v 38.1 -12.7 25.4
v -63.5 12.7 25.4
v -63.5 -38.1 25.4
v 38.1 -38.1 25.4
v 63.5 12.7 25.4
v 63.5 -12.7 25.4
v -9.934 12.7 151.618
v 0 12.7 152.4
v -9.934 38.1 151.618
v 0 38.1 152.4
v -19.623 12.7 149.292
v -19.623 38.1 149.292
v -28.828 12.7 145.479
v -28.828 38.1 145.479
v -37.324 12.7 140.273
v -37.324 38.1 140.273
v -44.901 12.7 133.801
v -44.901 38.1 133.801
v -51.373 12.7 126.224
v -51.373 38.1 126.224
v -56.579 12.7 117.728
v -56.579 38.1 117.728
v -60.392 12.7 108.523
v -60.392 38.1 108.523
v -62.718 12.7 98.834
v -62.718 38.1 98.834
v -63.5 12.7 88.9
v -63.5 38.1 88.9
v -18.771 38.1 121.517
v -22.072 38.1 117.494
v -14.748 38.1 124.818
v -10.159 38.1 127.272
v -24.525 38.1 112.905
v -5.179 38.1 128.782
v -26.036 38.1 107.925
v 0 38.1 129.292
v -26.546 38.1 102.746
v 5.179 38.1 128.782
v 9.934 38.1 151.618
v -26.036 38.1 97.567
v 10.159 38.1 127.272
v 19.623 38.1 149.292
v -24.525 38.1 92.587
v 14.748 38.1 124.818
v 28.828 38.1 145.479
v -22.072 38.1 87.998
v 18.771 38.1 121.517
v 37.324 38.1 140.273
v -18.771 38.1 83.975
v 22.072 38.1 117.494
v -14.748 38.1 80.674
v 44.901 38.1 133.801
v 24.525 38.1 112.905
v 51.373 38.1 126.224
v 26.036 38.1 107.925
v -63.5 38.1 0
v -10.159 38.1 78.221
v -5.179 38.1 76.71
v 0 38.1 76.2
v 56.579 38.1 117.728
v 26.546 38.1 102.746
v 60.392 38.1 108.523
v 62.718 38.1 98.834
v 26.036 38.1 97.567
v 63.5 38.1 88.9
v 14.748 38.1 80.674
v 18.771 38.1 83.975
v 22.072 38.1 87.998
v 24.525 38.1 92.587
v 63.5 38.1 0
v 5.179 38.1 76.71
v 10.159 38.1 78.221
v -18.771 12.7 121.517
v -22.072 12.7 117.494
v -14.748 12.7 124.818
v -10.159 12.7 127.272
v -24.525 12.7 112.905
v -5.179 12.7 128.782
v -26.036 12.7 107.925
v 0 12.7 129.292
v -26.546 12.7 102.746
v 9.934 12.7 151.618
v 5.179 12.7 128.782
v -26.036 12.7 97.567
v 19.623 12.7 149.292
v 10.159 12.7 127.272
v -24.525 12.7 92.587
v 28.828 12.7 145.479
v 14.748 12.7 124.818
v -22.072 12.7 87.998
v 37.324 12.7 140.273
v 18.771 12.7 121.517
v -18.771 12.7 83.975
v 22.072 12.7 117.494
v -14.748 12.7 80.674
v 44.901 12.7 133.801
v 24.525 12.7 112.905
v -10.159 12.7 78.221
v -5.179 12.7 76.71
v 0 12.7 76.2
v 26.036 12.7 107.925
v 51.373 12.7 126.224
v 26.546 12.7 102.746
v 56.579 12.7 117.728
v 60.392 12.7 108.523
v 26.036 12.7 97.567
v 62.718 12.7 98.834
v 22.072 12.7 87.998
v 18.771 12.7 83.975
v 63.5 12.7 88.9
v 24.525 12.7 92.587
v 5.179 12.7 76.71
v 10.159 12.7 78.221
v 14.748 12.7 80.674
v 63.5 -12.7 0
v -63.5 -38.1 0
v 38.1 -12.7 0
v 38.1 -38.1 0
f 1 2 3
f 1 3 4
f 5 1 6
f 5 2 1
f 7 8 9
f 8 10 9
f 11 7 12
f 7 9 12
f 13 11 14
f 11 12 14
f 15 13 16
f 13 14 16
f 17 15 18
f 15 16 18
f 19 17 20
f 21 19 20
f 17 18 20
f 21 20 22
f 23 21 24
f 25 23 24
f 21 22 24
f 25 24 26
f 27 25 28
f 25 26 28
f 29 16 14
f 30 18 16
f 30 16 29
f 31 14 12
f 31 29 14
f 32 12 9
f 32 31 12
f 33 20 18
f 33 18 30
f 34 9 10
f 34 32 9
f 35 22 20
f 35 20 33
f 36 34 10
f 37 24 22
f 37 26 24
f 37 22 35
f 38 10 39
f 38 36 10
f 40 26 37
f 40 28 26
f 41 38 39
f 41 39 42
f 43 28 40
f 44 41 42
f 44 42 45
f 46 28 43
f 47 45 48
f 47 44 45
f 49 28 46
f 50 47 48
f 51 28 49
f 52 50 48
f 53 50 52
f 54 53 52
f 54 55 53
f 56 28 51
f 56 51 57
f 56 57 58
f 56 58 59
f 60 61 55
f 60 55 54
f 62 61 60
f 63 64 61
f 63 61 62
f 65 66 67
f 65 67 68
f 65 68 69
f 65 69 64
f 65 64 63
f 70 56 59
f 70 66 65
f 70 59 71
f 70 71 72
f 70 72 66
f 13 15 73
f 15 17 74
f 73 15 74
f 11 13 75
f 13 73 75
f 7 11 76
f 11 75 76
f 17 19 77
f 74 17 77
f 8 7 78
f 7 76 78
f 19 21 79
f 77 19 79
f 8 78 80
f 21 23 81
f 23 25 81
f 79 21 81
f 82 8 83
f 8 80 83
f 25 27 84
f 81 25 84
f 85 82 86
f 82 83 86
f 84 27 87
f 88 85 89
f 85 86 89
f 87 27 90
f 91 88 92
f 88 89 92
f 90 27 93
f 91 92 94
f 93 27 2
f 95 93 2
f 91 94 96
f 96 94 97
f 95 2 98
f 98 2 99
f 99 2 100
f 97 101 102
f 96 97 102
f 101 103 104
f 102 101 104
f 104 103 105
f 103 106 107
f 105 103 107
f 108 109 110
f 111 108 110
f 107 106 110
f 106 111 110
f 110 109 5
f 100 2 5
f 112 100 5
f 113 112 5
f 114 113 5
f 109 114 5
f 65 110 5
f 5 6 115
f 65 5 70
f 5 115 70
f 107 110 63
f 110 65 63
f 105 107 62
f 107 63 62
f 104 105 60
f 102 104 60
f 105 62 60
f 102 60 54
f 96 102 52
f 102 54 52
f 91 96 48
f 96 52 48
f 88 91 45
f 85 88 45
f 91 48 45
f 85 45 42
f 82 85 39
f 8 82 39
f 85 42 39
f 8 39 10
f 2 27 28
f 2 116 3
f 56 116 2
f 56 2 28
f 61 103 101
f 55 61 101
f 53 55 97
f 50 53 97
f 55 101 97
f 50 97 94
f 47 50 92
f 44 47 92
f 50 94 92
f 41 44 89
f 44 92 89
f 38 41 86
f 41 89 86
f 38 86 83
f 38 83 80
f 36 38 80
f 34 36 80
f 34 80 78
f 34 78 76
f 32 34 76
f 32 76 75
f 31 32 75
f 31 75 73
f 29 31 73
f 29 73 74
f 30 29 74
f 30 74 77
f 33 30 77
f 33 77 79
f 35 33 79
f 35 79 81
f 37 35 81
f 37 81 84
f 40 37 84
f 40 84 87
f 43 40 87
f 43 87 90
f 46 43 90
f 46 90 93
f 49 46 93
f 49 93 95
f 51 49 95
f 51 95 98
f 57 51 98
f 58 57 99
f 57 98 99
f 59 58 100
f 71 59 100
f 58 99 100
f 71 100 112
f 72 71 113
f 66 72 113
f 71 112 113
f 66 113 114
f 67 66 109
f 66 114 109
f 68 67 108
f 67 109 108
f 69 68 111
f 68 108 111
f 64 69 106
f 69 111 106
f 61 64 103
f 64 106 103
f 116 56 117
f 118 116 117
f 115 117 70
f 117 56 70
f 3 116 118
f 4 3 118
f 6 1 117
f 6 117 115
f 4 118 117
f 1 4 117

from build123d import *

# Parameters (mm, degrees)
F1_DEPTH = 25.4
F2_W     = 127
F2_H     = 25.4
F3_DEPTH = 127
F4_R     = 63.5
F5_R     = 63.49999
F6_R     = 26.5461499869
F7_DEPTH = 25.401


# Not quite as in the source:
# - a fillet or chamfer is up to 0.001 mm smaller than in the source, because OpenCascade refuses the exact size


with BuildPart() as f1:
    # F0 (on Top) → F1 (new body)
    with BuildSketch(Plane.XY):
        Polygon((63.5, -12.7), (63.5, 38.1), (-63.5, 38.1), (-63.5, -38.1), (38.1, -38.1), (38.1, -12.7), align=None)
    extrude(amount=F1_DEPTH)

    # F2 (on face) → F3 (join)
    with BuildSketch(Plane.XY.offset(25.4)):
        with Locations((0, 25.4)):
            Rectangle(F2_W, F2_H)
    extrude(amount=F3_DEPTH)

    # F4
    f4_edges = [f1.edges().sort_by_distance(p)[0] for p in [
        (63.5, 25.4, 152.4),
    ]]
    fillet(f4_edges, radius=F4_R)

    # F5 (radius 63.5 in the source; OpenCascade refuses exactly that, so slightly less here)
    f5_edges = [f1.edges().sort_by_distance(p)[0] for p in [
        (-63.5, 25.4, 152.4),
    ]]
    fillet(f5_edges, radius=F5_R)

    # F6 (on face) → F7 (cut, through all)
    with BuildSketch(Plane.XZ.offset(-12.7)):
        with Locations((0, 102.7461499869)):
            Circle(F6_R)
    extrude(amount=-F7_DEPTH, mode=Mode.SUBTRACT)


solid = f1.part
